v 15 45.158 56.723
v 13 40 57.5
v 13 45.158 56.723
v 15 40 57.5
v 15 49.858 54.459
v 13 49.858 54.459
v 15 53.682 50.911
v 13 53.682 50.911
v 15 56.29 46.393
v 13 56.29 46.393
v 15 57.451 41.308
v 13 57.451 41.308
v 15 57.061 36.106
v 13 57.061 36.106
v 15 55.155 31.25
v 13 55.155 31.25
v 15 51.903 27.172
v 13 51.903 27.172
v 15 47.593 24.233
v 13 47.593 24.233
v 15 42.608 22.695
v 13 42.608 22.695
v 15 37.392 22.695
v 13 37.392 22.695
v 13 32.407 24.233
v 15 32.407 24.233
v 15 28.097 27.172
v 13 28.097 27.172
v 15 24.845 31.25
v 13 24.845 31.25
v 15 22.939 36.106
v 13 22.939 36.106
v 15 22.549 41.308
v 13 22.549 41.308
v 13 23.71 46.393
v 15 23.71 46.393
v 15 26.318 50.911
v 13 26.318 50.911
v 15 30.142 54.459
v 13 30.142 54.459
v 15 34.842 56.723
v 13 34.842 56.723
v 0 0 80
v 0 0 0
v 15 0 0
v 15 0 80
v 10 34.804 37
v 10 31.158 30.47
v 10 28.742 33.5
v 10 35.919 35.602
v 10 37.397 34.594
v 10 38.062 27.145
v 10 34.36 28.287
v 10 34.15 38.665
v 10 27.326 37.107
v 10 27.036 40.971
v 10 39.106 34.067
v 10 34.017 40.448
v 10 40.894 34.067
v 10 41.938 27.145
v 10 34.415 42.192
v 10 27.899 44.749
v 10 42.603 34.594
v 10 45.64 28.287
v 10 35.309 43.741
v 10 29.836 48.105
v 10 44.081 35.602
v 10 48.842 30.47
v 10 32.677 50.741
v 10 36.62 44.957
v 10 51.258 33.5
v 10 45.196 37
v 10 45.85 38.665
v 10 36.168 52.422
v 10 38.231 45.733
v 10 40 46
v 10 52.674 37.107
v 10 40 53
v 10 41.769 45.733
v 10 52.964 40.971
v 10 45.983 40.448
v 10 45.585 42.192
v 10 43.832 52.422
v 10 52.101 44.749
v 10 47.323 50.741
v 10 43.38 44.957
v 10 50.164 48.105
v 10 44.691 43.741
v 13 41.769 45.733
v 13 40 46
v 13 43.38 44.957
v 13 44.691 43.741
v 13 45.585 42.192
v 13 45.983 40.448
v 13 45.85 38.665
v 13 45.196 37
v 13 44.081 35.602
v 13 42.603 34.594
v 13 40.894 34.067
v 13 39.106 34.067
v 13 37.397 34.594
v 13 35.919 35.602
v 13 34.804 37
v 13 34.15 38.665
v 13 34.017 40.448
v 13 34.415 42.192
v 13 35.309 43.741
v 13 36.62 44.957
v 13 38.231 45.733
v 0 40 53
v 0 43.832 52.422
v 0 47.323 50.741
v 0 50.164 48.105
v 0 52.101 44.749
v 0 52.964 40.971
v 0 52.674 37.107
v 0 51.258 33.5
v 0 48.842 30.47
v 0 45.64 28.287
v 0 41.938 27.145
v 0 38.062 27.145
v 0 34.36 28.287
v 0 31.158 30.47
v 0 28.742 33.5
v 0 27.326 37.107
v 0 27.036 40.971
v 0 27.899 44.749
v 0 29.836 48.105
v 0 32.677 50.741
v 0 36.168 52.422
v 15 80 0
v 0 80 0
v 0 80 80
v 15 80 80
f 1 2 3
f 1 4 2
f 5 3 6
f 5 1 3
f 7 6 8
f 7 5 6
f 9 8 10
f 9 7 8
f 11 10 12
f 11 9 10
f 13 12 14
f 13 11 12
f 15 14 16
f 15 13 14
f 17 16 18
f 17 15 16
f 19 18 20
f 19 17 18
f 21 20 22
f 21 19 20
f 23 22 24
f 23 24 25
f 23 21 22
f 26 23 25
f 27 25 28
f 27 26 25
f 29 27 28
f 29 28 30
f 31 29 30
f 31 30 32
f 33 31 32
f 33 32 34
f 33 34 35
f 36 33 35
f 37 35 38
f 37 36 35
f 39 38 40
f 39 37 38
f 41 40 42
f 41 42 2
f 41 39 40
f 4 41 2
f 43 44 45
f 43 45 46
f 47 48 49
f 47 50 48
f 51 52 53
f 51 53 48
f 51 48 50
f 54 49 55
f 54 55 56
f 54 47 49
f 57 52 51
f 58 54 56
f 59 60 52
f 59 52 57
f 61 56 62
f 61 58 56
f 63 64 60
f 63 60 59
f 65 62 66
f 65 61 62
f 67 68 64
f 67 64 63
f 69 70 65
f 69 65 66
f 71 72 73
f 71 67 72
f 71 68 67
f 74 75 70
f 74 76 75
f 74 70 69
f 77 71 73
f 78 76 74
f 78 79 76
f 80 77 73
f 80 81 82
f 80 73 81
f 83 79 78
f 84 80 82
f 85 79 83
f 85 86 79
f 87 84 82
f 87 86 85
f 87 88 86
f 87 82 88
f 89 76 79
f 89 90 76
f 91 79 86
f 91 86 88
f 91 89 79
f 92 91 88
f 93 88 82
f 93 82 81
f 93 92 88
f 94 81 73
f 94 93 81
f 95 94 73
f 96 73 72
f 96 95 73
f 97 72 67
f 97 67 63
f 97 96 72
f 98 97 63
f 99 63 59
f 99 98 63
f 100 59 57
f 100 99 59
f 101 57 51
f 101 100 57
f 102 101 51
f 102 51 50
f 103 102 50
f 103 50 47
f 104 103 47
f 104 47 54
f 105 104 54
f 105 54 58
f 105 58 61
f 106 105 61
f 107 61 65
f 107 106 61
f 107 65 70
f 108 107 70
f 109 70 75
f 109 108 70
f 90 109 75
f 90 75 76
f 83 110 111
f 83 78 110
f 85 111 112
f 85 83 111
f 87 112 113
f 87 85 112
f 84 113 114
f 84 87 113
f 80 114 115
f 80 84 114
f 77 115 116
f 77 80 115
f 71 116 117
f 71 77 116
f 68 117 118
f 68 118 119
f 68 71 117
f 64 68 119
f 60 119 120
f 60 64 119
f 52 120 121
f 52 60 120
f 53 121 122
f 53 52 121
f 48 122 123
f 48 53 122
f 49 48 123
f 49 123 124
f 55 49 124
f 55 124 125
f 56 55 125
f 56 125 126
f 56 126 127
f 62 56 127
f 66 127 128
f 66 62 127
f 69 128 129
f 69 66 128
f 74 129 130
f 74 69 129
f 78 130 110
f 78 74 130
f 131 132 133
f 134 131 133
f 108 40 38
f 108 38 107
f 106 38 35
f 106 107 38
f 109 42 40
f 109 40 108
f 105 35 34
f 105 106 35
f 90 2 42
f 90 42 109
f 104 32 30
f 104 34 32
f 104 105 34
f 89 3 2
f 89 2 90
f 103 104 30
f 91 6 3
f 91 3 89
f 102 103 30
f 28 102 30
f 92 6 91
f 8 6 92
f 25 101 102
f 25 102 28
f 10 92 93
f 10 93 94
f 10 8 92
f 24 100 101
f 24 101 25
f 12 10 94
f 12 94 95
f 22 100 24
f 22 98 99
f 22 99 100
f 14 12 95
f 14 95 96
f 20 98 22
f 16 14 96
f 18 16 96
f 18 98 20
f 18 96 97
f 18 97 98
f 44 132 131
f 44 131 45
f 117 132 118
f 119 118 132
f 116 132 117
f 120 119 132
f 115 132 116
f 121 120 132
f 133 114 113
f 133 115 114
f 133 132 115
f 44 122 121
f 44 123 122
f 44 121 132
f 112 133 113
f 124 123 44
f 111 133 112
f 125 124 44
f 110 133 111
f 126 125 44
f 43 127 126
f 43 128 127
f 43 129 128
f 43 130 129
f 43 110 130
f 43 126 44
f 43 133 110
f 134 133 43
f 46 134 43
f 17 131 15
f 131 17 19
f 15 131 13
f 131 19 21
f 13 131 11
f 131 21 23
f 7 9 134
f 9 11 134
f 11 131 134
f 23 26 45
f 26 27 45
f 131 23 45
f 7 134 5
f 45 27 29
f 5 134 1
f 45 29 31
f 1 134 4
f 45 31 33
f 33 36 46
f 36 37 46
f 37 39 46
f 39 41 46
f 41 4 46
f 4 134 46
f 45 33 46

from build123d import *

# Parameters (mm, degrees)
SKETCH_1_W      = 80
SKETCH_1_H      = 80
EXTRUDE_1_DEPTH = 15


with BuildPart() as part:
    # Эскиз1 → Бобышка-Вытянуть1 (new body)
    with BuildSketch(Plane(origin=(0, 0, 0), x_dir=(0, -1, 0), z_dir=(-1, 0, 0))):
        with Locations((-40, 40)):
            Rectangle(SKETCH_1_W, SKETCH_1_H)
    extrude(amount=-EXTRUDE_1_DEPTH)

    # Эскиз2 → Вырез-Повернуть1 (revolve, cut)
    with BuildSketch(Plane(origin=(0, 0, 40), x_dir=(-1, 0, 0), z_dir=(0, 0, -1)), mode=Mode.PRIVATE) as cut_revolve_1_sk:
        Polygon((-15, 57.5), (-15, 40), (0, 40), (0, 53), (-10, 53), (-10, 46), (-13, 46), (-13, 57.5), align=None)
    revolve(cut_revolve_1_sk.sketch.rotate(Axis((15, 40, 40), (-1, 0, 0)), 270), axis=Axis((15, 40, 40), (-1, 0, 0)), mode=Mode.SUBTRACT)


solid = part.part
